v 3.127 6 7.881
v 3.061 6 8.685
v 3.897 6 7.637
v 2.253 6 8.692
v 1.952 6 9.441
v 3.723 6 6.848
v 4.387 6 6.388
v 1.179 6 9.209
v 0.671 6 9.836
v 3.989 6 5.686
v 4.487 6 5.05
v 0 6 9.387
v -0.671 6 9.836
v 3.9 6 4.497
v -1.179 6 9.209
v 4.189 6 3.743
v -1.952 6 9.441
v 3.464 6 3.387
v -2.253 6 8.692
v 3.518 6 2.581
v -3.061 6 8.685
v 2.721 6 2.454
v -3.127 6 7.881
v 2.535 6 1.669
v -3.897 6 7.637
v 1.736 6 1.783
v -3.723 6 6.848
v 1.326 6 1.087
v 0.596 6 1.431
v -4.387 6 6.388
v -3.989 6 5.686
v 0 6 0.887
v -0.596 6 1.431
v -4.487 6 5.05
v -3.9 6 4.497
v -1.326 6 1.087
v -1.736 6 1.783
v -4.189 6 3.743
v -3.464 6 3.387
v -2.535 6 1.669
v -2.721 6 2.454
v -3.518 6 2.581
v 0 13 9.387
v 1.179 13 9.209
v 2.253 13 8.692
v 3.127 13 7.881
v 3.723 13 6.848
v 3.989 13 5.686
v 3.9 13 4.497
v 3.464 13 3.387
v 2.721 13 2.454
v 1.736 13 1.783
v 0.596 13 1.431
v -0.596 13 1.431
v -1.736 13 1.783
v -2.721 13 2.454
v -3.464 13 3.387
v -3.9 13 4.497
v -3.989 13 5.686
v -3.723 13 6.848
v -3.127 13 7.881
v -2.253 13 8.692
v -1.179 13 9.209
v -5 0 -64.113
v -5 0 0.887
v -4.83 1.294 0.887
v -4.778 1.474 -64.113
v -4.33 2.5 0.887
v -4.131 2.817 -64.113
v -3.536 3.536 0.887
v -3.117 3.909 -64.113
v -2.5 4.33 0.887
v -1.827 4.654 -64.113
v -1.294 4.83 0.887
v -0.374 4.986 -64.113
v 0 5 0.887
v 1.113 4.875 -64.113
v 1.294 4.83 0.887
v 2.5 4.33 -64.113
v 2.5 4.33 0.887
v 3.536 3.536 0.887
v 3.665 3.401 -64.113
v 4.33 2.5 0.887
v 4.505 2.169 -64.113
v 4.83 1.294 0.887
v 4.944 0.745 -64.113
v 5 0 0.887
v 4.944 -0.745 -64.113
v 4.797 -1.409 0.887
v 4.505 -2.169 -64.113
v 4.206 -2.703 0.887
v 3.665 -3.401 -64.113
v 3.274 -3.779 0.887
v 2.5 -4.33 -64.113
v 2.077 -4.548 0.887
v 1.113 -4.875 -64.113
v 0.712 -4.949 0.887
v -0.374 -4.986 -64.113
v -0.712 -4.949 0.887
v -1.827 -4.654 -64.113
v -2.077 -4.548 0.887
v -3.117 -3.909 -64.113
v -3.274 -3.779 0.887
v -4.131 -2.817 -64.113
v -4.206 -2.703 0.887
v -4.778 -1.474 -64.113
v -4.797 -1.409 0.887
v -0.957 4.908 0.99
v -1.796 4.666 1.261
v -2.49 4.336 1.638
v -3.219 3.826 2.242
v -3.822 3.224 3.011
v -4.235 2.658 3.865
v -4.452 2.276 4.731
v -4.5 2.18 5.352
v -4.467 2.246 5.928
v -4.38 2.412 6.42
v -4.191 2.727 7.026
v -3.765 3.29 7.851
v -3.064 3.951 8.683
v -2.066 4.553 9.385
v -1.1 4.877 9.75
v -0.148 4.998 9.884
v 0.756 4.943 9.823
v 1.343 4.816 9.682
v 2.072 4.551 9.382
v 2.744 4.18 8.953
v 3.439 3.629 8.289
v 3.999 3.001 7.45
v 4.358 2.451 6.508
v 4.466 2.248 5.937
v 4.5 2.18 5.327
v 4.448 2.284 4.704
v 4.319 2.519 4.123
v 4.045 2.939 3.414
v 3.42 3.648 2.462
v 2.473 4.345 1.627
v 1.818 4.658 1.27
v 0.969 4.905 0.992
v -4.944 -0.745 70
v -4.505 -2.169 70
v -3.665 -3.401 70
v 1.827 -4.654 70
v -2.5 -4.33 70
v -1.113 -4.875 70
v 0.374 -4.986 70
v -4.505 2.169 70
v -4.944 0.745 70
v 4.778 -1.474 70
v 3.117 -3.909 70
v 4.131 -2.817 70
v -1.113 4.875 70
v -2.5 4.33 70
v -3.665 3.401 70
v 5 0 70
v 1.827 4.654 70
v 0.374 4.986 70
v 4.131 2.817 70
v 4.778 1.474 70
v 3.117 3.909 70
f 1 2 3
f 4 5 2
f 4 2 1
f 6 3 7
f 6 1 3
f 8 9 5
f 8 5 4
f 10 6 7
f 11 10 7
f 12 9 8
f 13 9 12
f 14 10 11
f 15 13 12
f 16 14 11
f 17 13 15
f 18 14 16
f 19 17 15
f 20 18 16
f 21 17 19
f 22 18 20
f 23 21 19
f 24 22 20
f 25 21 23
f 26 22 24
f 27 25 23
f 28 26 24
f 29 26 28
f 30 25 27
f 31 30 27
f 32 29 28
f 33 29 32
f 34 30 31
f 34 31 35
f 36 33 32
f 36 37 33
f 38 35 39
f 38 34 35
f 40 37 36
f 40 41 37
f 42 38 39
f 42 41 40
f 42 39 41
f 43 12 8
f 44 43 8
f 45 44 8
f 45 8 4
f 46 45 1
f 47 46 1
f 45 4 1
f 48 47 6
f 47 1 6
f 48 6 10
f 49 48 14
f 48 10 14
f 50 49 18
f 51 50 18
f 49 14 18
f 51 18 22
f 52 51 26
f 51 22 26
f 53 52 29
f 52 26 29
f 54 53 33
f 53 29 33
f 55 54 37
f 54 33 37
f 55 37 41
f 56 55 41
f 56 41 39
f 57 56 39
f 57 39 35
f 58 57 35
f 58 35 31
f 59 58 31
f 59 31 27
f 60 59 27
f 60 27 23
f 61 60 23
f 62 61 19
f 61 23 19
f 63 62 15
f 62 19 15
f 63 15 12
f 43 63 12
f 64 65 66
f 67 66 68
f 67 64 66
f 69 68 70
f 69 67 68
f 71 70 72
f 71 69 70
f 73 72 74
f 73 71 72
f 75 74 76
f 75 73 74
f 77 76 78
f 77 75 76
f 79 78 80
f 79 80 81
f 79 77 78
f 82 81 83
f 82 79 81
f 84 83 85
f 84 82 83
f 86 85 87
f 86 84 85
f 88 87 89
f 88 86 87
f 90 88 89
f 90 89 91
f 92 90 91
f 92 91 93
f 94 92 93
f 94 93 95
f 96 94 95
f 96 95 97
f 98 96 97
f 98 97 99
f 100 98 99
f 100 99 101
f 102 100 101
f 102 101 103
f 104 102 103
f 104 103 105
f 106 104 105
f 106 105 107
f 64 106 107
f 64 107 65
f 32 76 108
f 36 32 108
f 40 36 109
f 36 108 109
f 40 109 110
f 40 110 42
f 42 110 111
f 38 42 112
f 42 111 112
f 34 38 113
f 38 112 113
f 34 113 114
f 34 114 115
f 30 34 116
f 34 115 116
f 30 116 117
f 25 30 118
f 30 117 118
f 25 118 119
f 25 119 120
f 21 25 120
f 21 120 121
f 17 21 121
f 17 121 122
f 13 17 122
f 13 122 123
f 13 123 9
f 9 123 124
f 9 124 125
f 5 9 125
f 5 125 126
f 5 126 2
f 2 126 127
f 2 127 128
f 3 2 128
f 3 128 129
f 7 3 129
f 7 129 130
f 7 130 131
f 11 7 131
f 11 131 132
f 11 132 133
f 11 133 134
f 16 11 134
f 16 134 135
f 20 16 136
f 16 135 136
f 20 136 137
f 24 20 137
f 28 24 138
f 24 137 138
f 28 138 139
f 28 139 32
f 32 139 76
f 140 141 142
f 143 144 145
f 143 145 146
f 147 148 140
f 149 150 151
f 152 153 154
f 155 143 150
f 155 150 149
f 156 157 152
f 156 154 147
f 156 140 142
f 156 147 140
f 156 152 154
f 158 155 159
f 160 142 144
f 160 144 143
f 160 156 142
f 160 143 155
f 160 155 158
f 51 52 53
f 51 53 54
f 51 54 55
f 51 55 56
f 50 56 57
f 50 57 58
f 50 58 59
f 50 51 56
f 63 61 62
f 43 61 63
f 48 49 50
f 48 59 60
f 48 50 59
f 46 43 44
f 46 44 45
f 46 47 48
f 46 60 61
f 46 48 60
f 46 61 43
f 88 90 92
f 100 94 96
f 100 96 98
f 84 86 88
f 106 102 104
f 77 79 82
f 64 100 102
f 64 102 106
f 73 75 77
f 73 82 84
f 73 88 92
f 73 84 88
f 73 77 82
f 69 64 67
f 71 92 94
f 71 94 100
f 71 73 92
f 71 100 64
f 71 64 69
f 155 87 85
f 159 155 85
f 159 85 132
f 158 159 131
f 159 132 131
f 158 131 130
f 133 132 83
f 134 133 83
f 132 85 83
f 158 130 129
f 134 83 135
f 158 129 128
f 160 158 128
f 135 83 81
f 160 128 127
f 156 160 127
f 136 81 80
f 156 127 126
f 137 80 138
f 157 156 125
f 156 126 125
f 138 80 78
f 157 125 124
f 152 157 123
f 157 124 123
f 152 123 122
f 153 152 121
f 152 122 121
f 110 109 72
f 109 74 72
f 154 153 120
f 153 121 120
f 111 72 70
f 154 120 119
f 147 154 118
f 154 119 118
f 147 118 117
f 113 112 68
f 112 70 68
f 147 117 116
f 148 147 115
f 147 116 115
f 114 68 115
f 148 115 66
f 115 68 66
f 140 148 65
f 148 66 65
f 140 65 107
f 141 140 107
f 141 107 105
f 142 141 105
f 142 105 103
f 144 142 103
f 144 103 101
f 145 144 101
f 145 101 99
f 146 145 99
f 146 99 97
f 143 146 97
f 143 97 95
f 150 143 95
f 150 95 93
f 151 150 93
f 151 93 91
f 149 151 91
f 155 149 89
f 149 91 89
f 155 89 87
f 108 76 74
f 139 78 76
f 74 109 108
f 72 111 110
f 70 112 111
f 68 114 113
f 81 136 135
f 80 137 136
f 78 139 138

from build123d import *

# Parameters (mm, degrees)
SKETCH1_R           = 5
BOSS_EXTRUDE1_DEPTH = 70
SKETCH2_R           = 4.5
BOSS_EXTRUDE2_DEPTH = 6
SKETCH3_R           = 5
CUT_EXTRUDE2_DEPTH  = 0.88667719
SKETCH4_R           = 4
BOSS_EXTRUDE3_DEPTH = 7
BOSS_EXTRUDE4_START = 65
SKETCH5_R           = 5
BOSS_EXTRUDE4_DEPTH = 65


with BuildPart() as part:
    # Sketch1 → Boss-Extrude1 (new body)
    with BuildSketch(Plane.XY):
        Circle(SKETCH1_R)
    extrude(amount=BOSS_EXTRUDE1_DEPTH)

    # Sketch2 → Boss-Extrude2 (add)
    with BuildSketch(Plane(origin=(0, 0, 0), x_dir=(1, 0, 0), z_dir=(0, 1, 0))):
        with Locations(Location((0, -5.386677191, 0), (0, 0, 90))):
            Circle(SKETCH2_R)
    extrude(amount=BOSS_EXTRUDE2_DEPTH)

    # Sketch3 → Cut-Extrude2 (cut)
    with BuildSketch(Plane(origin=(0, 0, 0), x_dir=(-1, 0, 0), z_dir=(0, 0, -1))):
        with Locations(Location((0, 0, 0), (0, 0, 90))):
            Circle(SKETCH3_R)
    extrude(amount=-CUT_EXTRUDE2_DEPTH, mode=Mode.SUBTRACT)

    # Sketch4 → Boss-Extrude3 (add)
    with BuildSketch(Plane(origin=(0, 6, 0), x_dir=(1, 0, 0), z_dir=(0, 1, 0))):
        with Locations(Location((0, -5.386677191, 0), (0, 0, 270))):
            Circle(SKETCH4_R)
    extrude(amount=BOSS_EXTRUDE3_DEPTH)

    # Sketch5 → Boss-Extrude4 (add)
    with BuildSketch(Plane(origin=(0, 0, 0.88667719), x_dir=(-1, 0, 0), z_dir=(0, 0, -1)).offset(BOSS_EXTRUDE4_START)):
        Circle(SKETCH5_R)
    extrude(amount=-BOSS_EXTRUDE4_DEPTH)


solid = part.part
